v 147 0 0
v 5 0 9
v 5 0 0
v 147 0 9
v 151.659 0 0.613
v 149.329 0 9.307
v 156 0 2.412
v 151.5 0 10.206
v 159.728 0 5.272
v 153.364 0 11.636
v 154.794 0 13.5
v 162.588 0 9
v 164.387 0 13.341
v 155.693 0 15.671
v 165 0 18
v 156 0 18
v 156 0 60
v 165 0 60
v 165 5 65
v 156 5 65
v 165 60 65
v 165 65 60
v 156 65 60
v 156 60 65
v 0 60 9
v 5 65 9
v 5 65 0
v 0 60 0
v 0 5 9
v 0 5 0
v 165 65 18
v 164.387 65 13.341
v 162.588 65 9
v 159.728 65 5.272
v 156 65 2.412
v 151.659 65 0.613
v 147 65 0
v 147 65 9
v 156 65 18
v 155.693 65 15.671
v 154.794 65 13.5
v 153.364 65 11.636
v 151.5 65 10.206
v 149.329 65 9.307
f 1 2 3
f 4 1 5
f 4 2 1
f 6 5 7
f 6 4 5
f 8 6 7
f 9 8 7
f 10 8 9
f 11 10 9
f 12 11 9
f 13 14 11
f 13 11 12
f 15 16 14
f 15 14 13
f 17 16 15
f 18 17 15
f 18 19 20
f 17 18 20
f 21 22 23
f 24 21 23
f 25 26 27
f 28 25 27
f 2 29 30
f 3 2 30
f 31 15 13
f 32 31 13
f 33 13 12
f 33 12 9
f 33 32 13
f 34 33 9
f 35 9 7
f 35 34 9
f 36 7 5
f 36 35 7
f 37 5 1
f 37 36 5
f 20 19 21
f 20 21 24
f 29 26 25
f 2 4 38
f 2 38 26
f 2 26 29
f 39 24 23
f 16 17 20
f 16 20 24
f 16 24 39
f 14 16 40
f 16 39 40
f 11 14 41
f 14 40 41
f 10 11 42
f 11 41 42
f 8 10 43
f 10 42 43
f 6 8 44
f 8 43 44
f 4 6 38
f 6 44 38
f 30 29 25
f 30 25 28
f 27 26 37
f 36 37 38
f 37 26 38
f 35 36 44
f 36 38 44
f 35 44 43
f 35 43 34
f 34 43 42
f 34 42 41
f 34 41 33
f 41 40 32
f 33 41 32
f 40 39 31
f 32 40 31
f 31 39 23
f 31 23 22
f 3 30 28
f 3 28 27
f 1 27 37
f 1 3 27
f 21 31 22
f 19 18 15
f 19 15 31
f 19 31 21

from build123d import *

# Parameters (mm, degrees)
F1_DEPTH = 65
F2_R     = 9
F3_R     = 18
F4_SIZE  = 5


with BuildPart() as f1:
    # F0 (on Front) → F1 (new body)
    with BuildSketch(Plane.XZ):
        Polygon((0, 9), (0, 0), (165, 0), (165, 65), (156, 65), (156, 9), align=None)
    extrude(amount=-F1_DEPTH)

    # F2
    f2_edges = [f1.edges().sort_by_distance(p)[0] for p in [
        (156, 32.5, 9),
    ]]
    fillet(f2_edges, radius=F2_R)

    # F3
    f3_edges = [f1.edges().sort_by_distance(p)[0] for p in [
        (165, 32.5, 0),
    ]]
    fillet(f3_edges, radius=F3_R)

    # F4
    f4_edges = [f1.edges().sort_by_distance(p)[0] for p in [
        (160.5, 65, 65),
        (160.5, 0, 65),
        (0, 65, 4.5),
        (0, 0, 4.5),
    ]]
    chamfer(f4_edges, length=F4_SIZE)


solid = f1.part
